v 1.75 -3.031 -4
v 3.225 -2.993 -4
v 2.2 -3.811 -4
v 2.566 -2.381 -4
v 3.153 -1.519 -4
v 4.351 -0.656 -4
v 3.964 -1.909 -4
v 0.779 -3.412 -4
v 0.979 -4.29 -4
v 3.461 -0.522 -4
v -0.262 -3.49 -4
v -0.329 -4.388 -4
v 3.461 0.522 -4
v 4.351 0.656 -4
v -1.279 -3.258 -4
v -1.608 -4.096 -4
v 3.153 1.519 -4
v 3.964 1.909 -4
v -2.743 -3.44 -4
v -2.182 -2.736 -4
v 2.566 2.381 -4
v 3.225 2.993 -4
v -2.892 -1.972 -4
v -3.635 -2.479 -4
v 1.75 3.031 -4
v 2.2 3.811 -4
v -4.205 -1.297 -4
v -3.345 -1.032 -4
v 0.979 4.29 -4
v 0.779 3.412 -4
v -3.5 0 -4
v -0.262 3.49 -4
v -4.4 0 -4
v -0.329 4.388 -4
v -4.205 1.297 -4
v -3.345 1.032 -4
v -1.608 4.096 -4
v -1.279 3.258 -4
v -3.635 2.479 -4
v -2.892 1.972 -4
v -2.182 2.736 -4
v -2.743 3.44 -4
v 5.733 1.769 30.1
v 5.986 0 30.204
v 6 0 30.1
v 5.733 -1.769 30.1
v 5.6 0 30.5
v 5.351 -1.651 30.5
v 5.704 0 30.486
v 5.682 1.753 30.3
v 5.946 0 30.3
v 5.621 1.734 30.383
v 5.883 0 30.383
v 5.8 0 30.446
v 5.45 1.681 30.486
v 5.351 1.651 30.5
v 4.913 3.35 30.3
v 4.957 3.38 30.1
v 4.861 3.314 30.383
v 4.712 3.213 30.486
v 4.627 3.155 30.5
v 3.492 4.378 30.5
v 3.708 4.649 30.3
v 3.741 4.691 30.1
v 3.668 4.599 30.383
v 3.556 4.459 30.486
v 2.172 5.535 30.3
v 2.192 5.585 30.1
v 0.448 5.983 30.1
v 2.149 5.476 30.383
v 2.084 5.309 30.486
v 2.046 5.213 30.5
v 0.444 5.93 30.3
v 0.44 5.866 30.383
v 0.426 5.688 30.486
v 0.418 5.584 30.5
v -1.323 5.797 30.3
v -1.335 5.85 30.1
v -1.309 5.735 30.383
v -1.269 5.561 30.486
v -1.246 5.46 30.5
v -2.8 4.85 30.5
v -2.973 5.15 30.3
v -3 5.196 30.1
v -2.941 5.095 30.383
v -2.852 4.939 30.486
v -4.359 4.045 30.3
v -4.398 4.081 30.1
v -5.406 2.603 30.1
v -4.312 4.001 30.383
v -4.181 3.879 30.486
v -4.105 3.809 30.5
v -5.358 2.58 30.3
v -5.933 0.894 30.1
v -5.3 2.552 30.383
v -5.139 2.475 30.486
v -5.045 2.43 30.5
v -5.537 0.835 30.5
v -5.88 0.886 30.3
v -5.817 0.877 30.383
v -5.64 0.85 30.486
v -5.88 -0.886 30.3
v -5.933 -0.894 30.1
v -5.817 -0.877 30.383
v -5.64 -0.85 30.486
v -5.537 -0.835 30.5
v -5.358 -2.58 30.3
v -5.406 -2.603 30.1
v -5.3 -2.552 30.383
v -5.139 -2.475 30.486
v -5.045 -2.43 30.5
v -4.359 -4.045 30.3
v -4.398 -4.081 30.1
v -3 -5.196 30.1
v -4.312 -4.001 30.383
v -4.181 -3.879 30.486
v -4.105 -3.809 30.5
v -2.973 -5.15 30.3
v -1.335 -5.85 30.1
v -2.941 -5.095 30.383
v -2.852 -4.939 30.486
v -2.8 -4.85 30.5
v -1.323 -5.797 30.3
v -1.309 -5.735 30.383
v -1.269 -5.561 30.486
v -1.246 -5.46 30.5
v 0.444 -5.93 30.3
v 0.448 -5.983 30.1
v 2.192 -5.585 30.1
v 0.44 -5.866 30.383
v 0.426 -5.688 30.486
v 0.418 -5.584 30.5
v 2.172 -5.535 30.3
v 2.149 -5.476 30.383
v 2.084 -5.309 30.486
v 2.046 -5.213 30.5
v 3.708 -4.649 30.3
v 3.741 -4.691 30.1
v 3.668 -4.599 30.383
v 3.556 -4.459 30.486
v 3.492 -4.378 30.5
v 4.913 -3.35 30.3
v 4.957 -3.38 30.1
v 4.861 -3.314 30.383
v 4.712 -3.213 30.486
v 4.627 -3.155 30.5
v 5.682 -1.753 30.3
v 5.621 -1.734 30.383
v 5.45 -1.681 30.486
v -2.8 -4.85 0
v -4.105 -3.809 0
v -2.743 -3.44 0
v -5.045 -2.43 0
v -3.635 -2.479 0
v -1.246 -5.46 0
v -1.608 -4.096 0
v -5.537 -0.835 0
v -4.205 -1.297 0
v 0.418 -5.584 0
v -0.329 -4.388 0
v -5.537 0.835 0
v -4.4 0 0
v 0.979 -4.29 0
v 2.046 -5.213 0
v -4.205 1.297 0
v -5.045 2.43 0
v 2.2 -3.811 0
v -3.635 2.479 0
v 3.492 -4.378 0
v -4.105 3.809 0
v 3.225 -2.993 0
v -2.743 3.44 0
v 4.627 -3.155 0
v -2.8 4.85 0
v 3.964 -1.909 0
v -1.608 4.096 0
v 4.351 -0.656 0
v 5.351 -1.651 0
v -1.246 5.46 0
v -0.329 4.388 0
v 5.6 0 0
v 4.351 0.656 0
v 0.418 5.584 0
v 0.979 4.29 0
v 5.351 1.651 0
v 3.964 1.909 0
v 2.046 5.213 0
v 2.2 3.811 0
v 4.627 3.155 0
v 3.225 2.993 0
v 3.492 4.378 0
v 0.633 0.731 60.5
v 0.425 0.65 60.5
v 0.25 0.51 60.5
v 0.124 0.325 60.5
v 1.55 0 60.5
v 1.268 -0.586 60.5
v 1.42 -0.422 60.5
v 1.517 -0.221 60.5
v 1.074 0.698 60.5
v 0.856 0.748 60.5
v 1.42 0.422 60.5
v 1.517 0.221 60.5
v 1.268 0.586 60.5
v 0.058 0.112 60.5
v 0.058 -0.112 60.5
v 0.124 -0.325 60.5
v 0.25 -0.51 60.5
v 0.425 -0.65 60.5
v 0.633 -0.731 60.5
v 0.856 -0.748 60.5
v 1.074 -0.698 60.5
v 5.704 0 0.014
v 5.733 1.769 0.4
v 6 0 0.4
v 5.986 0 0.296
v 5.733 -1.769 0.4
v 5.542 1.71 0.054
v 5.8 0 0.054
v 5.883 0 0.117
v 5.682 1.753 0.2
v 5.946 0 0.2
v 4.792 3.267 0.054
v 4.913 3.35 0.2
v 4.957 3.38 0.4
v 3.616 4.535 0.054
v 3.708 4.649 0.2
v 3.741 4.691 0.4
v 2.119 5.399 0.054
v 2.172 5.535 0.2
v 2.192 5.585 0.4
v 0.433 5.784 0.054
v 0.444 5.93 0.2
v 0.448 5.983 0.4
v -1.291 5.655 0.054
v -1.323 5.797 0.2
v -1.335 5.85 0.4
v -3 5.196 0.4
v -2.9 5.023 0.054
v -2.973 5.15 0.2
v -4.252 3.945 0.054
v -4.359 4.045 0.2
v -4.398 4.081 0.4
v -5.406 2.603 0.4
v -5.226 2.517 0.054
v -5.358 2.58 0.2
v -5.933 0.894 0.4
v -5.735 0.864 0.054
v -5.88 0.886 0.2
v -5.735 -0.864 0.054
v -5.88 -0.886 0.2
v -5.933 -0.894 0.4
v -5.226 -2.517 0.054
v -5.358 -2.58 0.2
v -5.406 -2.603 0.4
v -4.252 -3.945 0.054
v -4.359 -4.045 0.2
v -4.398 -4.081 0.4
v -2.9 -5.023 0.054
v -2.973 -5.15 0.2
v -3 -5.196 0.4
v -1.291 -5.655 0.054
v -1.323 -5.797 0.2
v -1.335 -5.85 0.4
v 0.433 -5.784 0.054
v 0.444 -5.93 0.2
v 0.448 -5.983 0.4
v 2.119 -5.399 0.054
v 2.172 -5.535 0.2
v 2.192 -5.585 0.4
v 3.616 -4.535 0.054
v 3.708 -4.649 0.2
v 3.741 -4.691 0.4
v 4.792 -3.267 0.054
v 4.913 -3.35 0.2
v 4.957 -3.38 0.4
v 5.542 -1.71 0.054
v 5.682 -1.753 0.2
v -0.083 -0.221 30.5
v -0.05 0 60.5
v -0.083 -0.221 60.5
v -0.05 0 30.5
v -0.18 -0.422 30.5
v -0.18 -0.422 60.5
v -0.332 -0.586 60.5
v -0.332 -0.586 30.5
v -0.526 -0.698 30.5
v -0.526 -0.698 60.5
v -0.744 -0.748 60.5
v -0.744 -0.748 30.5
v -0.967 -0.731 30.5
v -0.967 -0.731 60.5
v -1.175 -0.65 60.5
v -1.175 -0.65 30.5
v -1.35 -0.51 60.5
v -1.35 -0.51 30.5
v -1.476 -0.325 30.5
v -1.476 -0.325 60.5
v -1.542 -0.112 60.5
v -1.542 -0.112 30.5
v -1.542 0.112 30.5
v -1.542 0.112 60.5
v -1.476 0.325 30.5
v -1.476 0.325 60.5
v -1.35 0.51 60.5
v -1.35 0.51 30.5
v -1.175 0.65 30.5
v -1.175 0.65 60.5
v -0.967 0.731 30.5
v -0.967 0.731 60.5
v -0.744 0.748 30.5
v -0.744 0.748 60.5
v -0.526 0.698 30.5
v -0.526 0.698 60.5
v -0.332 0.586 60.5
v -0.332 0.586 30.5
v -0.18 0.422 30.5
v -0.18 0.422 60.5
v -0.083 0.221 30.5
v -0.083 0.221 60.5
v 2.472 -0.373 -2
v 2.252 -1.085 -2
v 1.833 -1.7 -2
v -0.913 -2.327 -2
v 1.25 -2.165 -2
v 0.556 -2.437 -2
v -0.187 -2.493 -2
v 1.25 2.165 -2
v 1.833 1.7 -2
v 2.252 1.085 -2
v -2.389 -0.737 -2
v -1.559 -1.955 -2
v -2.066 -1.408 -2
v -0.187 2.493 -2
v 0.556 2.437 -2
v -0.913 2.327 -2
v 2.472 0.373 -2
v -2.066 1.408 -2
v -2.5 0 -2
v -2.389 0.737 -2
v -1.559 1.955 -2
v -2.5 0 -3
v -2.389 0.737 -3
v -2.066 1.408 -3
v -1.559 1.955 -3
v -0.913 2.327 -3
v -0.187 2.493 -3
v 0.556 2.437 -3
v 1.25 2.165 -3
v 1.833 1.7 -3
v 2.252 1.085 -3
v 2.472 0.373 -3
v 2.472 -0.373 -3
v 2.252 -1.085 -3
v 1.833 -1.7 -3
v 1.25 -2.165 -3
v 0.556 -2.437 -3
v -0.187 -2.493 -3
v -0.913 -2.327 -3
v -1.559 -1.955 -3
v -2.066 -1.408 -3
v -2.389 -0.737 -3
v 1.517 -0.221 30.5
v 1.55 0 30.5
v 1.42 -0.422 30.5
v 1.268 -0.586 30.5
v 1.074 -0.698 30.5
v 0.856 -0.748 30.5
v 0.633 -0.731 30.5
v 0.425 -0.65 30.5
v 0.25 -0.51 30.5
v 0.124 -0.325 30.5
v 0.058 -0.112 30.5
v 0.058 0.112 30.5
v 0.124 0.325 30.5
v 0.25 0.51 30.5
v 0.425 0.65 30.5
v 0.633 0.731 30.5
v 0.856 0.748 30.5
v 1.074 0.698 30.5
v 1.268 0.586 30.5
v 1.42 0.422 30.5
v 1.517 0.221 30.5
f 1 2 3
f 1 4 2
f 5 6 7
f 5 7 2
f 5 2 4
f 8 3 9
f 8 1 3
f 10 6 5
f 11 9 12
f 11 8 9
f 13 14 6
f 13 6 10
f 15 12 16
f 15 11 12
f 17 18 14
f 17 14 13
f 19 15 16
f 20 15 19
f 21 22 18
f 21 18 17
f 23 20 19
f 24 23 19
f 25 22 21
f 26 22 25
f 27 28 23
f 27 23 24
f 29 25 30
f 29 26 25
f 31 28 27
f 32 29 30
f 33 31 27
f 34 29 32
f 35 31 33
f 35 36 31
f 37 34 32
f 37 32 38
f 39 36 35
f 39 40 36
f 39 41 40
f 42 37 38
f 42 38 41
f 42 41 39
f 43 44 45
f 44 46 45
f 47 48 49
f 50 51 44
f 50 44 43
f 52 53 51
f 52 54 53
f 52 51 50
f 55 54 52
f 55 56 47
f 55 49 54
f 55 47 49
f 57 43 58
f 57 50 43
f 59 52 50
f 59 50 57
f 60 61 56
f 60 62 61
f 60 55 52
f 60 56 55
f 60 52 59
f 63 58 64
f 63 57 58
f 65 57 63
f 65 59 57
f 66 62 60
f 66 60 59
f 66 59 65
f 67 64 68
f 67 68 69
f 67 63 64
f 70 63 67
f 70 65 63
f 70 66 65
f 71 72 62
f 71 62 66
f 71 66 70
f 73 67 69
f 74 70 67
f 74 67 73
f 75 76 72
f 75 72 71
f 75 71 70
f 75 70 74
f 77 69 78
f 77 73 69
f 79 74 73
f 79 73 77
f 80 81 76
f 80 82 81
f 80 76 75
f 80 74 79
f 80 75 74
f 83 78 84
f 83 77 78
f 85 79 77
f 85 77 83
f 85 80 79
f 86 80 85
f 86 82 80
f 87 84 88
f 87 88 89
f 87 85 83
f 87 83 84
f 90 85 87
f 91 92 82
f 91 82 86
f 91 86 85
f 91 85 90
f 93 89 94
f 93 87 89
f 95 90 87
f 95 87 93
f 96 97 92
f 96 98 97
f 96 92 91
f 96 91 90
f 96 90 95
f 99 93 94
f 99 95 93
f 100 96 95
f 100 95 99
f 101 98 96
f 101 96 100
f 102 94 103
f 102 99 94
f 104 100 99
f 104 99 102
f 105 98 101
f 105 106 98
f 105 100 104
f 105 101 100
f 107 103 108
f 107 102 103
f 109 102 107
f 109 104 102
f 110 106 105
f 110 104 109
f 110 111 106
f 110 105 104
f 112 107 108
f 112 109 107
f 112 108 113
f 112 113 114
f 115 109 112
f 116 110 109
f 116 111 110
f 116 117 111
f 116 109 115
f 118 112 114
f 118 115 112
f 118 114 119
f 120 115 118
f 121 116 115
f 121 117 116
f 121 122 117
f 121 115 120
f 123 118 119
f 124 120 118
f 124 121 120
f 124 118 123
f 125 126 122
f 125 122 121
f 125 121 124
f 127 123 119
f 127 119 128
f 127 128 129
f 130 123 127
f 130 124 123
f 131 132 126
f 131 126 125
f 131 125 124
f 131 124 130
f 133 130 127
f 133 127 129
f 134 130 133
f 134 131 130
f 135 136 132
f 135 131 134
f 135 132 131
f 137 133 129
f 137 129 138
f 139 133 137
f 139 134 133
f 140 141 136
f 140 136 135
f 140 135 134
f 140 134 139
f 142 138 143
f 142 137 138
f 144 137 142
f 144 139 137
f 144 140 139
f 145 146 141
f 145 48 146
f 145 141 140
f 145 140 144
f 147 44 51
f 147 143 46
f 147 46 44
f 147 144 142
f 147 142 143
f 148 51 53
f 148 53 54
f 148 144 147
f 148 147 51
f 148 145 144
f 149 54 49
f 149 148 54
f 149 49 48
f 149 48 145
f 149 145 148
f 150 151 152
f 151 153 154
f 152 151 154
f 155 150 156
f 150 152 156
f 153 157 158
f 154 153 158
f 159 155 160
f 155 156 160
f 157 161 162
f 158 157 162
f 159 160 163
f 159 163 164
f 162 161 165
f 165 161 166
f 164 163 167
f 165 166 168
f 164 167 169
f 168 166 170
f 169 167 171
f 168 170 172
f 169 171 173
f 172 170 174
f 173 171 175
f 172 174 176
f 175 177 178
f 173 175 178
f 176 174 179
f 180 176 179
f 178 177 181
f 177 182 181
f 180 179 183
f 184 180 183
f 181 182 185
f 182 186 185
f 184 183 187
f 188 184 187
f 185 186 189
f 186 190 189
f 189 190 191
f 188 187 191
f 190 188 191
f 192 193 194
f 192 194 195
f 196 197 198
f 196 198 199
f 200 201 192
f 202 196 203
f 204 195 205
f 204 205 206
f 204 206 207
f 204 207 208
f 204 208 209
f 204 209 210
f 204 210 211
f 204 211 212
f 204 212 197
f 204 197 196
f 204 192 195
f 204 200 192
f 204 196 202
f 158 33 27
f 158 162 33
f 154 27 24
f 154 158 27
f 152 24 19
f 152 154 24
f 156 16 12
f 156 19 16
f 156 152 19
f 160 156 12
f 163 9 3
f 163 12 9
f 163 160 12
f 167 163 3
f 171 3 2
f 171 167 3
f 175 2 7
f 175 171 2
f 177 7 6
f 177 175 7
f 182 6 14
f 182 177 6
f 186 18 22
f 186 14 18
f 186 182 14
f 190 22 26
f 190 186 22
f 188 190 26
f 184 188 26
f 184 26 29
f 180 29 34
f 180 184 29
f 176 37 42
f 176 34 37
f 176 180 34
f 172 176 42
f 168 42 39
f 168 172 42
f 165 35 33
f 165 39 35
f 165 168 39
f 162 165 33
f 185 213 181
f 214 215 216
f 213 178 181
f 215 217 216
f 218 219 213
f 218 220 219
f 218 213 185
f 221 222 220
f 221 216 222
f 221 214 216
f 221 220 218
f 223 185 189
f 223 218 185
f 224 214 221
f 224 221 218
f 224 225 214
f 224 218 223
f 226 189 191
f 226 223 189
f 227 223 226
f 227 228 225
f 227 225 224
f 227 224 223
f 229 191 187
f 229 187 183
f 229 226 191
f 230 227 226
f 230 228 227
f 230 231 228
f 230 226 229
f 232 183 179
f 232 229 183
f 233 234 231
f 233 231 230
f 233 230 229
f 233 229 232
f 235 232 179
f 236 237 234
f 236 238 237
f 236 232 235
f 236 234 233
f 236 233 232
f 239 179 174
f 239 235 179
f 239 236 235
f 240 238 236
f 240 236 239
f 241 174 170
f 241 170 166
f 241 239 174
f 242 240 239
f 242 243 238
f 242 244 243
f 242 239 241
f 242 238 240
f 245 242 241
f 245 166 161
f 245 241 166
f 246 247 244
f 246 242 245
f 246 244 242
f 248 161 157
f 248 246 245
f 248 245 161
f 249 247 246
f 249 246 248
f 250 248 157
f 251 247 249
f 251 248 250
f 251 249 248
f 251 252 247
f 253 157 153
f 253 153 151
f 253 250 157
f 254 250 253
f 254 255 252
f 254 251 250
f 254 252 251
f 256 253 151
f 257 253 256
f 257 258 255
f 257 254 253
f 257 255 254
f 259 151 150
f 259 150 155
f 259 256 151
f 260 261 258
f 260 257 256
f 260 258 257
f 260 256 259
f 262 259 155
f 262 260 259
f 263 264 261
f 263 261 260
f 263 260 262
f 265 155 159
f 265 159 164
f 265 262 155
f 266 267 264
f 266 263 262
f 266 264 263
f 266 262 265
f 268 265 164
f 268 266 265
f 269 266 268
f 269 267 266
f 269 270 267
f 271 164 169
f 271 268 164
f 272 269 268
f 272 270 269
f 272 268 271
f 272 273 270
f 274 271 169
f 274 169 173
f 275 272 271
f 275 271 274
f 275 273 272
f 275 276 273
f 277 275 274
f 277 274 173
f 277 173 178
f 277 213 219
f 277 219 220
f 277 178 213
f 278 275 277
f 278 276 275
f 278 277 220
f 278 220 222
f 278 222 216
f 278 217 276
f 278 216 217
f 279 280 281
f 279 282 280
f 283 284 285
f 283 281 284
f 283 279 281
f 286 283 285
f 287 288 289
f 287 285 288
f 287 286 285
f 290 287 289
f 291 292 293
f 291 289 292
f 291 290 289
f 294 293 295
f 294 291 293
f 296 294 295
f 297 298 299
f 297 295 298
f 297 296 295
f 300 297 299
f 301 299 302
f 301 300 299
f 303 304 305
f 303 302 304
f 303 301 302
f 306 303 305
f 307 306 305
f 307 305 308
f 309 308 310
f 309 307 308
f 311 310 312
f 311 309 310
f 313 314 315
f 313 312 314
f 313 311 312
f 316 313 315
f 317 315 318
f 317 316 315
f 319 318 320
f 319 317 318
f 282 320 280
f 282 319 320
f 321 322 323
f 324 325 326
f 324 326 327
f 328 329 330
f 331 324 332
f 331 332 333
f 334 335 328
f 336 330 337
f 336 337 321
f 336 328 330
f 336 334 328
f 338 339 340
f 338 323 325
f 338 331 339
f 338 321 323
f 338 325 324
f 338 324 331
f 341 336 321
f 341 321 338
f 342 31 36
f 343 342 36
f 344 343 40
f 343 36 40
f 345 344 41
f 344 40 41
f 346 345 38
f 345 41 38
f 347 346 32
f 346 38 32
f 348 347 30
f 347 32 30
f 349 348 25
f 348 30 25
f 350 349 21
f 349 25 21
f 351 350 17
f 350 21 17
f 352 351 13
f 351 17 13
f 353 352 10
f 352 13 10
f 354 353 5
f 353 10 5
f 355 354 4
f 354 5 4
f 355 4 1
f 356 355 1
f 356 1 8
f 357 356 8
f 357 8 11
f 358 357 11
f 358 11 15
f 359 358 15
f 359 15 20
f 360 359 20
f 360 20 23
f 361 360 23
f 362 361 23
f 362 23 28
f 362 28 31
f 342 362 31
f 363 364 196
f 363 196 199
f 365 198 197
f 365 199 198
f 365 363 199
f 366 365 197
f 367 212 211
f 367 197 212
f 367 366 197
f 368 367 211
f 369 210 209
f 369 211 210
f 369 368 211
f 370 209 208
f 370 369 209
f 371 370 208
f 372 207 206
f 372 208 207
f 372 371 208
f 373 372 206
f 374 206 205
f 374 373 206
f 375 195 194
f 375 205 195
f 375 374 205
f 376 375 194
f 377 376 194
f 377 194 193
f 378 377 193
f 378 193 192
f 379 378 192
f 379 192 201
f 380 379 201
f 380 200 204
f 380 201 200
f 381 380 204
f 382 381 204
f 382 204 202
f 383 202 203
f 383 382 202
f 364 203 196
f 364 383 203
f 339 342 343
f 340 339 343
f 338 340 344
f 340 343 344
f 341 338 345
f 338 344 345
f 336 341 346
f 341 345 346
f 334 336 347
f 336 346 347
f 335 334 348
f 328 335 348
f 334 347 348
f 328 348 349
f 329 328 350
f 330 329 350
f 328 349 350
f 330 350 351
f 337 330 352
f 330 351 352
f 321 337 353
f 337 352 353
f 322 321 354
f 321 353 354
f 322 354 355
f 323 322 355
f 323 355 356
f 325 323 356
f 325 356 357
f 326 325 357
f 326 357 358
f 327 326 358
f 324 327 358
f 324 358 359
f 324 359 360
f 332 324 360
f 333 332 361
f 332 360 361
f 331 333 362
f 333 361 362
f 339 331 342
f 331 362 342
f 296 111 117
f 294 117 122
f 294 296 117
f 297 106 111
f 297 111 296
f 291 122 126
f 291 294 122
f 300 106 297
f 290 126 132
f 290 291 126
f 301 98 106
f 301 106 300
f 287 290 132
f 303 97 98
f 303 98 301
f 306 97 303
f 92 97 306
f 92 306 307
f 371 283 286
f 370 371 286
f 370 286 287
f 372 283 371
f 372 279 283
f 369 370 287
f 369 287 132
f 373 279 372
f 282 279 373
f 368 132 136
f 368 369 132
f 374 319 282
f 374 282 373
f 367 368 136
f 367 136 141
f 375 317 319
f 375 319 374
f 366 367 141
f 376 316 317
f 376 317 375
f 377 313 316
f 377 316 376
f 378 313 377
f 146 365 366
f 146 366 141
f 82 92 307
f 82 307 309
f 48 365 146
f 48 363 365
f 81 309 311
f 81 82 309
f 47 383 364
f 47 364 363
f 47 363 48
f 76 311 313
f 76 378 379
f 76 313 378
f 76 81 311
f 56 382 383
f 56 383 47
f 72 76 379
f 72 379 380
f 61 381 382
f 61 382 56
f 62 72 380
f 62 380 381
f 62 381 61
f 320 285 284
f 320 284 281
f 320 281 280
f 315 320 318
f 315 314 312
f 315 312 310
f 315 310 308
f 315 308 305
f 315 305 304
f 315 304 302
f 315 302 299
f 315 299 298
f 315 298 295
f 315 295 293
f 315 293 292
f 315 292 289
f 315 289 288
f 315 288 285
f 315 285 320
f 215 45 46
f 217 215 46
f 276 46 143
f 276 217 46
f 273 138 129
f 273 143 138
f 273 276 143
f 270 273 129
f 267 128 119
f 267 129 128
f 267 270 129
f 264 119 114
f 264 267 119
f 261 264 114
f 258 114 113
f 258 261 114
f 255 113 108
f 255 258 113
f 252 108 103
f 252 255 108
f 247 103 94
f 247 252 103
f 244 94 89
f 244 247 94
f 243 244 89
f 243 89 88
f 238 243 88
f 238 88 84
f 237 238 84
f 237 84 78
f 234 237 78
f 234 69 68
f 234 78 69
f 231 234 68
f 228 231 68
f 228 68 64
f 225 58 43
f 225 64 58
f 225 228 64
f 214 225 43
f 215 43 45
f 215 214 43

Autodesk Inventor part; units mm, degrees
ref_plane "YZ Plane" through (0, 0, 0) normal (1, 0, 0) x (0, 1, 0)
ref_plane "XZ Plane" through (0, 0, 0) normal (0, 1, 0) x (-1, 0, 0)
ref_plane "XY Plane" through (0, 0, 0) normal (0, 0, 1) x (1, 0, 0)
sketch "Sketch1" plane through (0, 0, 0) normal (0, 0, 1) x (1, 0, 0)
  circle A0 centre (0, 0) radius 6
  dimension "d0" = 12
extrude "Extrusion1" add sketch "Sketch1" along normal blind 30.5
sketch "Sketch2" plane through (0, 0, 30.5) normal (0, 0, 1) x (1, 0, 0)
  circle A0 centre (-0.8, 0) radius 0.75
  circle A1 centre (0.8, 0) radius 0.75
  circle A2 centre (0, 0) radius 1.75
  dimension "d3" = 1.5
  dimension "d4" = 1.5
  dimension "d5" = 1.6
  dimension "d6" = 0.8
  dimension "d7" = 3.5
extrude "Extrusion2" add sketch "Sketch2" along normal blind 30 contours A0 | A1
sketch "Sketch3" plane through (0, 0, 0) normal (0, 0, -1) x (-1, 0, 0)
  circle A0 centre (0, 0) radius 4.4
  dimension "d10" = 8.8
extrude "Extrusion3" add sketch "Sketch3" along normal blind 4
sketch "Sketch4" plane through (0, 0, -4) normal (0, 0, -1) x (-1, 0, 0)
  circle A0 centre (0, 0) radius 2.5
  dimension "d13" = 5
extrude "Extrusion4" cut sketch "Sketch4" against normal blind 2
chamfer "Chamfer1" distance 1 angle 45 1 edges at (2.5, 0, -4)
thread "Thread1" size "M9x0.5" class "6g" standard "ANSI Metric M Profile" full length
fillet "Fillet1" radius 0.4 2 edges at (-6, 0, 30.5) (-6, 0, 0)
equation "\"d6\" = 0.5 * d5"
properties part number "COTS_GENERIC_Engraving_laser"
